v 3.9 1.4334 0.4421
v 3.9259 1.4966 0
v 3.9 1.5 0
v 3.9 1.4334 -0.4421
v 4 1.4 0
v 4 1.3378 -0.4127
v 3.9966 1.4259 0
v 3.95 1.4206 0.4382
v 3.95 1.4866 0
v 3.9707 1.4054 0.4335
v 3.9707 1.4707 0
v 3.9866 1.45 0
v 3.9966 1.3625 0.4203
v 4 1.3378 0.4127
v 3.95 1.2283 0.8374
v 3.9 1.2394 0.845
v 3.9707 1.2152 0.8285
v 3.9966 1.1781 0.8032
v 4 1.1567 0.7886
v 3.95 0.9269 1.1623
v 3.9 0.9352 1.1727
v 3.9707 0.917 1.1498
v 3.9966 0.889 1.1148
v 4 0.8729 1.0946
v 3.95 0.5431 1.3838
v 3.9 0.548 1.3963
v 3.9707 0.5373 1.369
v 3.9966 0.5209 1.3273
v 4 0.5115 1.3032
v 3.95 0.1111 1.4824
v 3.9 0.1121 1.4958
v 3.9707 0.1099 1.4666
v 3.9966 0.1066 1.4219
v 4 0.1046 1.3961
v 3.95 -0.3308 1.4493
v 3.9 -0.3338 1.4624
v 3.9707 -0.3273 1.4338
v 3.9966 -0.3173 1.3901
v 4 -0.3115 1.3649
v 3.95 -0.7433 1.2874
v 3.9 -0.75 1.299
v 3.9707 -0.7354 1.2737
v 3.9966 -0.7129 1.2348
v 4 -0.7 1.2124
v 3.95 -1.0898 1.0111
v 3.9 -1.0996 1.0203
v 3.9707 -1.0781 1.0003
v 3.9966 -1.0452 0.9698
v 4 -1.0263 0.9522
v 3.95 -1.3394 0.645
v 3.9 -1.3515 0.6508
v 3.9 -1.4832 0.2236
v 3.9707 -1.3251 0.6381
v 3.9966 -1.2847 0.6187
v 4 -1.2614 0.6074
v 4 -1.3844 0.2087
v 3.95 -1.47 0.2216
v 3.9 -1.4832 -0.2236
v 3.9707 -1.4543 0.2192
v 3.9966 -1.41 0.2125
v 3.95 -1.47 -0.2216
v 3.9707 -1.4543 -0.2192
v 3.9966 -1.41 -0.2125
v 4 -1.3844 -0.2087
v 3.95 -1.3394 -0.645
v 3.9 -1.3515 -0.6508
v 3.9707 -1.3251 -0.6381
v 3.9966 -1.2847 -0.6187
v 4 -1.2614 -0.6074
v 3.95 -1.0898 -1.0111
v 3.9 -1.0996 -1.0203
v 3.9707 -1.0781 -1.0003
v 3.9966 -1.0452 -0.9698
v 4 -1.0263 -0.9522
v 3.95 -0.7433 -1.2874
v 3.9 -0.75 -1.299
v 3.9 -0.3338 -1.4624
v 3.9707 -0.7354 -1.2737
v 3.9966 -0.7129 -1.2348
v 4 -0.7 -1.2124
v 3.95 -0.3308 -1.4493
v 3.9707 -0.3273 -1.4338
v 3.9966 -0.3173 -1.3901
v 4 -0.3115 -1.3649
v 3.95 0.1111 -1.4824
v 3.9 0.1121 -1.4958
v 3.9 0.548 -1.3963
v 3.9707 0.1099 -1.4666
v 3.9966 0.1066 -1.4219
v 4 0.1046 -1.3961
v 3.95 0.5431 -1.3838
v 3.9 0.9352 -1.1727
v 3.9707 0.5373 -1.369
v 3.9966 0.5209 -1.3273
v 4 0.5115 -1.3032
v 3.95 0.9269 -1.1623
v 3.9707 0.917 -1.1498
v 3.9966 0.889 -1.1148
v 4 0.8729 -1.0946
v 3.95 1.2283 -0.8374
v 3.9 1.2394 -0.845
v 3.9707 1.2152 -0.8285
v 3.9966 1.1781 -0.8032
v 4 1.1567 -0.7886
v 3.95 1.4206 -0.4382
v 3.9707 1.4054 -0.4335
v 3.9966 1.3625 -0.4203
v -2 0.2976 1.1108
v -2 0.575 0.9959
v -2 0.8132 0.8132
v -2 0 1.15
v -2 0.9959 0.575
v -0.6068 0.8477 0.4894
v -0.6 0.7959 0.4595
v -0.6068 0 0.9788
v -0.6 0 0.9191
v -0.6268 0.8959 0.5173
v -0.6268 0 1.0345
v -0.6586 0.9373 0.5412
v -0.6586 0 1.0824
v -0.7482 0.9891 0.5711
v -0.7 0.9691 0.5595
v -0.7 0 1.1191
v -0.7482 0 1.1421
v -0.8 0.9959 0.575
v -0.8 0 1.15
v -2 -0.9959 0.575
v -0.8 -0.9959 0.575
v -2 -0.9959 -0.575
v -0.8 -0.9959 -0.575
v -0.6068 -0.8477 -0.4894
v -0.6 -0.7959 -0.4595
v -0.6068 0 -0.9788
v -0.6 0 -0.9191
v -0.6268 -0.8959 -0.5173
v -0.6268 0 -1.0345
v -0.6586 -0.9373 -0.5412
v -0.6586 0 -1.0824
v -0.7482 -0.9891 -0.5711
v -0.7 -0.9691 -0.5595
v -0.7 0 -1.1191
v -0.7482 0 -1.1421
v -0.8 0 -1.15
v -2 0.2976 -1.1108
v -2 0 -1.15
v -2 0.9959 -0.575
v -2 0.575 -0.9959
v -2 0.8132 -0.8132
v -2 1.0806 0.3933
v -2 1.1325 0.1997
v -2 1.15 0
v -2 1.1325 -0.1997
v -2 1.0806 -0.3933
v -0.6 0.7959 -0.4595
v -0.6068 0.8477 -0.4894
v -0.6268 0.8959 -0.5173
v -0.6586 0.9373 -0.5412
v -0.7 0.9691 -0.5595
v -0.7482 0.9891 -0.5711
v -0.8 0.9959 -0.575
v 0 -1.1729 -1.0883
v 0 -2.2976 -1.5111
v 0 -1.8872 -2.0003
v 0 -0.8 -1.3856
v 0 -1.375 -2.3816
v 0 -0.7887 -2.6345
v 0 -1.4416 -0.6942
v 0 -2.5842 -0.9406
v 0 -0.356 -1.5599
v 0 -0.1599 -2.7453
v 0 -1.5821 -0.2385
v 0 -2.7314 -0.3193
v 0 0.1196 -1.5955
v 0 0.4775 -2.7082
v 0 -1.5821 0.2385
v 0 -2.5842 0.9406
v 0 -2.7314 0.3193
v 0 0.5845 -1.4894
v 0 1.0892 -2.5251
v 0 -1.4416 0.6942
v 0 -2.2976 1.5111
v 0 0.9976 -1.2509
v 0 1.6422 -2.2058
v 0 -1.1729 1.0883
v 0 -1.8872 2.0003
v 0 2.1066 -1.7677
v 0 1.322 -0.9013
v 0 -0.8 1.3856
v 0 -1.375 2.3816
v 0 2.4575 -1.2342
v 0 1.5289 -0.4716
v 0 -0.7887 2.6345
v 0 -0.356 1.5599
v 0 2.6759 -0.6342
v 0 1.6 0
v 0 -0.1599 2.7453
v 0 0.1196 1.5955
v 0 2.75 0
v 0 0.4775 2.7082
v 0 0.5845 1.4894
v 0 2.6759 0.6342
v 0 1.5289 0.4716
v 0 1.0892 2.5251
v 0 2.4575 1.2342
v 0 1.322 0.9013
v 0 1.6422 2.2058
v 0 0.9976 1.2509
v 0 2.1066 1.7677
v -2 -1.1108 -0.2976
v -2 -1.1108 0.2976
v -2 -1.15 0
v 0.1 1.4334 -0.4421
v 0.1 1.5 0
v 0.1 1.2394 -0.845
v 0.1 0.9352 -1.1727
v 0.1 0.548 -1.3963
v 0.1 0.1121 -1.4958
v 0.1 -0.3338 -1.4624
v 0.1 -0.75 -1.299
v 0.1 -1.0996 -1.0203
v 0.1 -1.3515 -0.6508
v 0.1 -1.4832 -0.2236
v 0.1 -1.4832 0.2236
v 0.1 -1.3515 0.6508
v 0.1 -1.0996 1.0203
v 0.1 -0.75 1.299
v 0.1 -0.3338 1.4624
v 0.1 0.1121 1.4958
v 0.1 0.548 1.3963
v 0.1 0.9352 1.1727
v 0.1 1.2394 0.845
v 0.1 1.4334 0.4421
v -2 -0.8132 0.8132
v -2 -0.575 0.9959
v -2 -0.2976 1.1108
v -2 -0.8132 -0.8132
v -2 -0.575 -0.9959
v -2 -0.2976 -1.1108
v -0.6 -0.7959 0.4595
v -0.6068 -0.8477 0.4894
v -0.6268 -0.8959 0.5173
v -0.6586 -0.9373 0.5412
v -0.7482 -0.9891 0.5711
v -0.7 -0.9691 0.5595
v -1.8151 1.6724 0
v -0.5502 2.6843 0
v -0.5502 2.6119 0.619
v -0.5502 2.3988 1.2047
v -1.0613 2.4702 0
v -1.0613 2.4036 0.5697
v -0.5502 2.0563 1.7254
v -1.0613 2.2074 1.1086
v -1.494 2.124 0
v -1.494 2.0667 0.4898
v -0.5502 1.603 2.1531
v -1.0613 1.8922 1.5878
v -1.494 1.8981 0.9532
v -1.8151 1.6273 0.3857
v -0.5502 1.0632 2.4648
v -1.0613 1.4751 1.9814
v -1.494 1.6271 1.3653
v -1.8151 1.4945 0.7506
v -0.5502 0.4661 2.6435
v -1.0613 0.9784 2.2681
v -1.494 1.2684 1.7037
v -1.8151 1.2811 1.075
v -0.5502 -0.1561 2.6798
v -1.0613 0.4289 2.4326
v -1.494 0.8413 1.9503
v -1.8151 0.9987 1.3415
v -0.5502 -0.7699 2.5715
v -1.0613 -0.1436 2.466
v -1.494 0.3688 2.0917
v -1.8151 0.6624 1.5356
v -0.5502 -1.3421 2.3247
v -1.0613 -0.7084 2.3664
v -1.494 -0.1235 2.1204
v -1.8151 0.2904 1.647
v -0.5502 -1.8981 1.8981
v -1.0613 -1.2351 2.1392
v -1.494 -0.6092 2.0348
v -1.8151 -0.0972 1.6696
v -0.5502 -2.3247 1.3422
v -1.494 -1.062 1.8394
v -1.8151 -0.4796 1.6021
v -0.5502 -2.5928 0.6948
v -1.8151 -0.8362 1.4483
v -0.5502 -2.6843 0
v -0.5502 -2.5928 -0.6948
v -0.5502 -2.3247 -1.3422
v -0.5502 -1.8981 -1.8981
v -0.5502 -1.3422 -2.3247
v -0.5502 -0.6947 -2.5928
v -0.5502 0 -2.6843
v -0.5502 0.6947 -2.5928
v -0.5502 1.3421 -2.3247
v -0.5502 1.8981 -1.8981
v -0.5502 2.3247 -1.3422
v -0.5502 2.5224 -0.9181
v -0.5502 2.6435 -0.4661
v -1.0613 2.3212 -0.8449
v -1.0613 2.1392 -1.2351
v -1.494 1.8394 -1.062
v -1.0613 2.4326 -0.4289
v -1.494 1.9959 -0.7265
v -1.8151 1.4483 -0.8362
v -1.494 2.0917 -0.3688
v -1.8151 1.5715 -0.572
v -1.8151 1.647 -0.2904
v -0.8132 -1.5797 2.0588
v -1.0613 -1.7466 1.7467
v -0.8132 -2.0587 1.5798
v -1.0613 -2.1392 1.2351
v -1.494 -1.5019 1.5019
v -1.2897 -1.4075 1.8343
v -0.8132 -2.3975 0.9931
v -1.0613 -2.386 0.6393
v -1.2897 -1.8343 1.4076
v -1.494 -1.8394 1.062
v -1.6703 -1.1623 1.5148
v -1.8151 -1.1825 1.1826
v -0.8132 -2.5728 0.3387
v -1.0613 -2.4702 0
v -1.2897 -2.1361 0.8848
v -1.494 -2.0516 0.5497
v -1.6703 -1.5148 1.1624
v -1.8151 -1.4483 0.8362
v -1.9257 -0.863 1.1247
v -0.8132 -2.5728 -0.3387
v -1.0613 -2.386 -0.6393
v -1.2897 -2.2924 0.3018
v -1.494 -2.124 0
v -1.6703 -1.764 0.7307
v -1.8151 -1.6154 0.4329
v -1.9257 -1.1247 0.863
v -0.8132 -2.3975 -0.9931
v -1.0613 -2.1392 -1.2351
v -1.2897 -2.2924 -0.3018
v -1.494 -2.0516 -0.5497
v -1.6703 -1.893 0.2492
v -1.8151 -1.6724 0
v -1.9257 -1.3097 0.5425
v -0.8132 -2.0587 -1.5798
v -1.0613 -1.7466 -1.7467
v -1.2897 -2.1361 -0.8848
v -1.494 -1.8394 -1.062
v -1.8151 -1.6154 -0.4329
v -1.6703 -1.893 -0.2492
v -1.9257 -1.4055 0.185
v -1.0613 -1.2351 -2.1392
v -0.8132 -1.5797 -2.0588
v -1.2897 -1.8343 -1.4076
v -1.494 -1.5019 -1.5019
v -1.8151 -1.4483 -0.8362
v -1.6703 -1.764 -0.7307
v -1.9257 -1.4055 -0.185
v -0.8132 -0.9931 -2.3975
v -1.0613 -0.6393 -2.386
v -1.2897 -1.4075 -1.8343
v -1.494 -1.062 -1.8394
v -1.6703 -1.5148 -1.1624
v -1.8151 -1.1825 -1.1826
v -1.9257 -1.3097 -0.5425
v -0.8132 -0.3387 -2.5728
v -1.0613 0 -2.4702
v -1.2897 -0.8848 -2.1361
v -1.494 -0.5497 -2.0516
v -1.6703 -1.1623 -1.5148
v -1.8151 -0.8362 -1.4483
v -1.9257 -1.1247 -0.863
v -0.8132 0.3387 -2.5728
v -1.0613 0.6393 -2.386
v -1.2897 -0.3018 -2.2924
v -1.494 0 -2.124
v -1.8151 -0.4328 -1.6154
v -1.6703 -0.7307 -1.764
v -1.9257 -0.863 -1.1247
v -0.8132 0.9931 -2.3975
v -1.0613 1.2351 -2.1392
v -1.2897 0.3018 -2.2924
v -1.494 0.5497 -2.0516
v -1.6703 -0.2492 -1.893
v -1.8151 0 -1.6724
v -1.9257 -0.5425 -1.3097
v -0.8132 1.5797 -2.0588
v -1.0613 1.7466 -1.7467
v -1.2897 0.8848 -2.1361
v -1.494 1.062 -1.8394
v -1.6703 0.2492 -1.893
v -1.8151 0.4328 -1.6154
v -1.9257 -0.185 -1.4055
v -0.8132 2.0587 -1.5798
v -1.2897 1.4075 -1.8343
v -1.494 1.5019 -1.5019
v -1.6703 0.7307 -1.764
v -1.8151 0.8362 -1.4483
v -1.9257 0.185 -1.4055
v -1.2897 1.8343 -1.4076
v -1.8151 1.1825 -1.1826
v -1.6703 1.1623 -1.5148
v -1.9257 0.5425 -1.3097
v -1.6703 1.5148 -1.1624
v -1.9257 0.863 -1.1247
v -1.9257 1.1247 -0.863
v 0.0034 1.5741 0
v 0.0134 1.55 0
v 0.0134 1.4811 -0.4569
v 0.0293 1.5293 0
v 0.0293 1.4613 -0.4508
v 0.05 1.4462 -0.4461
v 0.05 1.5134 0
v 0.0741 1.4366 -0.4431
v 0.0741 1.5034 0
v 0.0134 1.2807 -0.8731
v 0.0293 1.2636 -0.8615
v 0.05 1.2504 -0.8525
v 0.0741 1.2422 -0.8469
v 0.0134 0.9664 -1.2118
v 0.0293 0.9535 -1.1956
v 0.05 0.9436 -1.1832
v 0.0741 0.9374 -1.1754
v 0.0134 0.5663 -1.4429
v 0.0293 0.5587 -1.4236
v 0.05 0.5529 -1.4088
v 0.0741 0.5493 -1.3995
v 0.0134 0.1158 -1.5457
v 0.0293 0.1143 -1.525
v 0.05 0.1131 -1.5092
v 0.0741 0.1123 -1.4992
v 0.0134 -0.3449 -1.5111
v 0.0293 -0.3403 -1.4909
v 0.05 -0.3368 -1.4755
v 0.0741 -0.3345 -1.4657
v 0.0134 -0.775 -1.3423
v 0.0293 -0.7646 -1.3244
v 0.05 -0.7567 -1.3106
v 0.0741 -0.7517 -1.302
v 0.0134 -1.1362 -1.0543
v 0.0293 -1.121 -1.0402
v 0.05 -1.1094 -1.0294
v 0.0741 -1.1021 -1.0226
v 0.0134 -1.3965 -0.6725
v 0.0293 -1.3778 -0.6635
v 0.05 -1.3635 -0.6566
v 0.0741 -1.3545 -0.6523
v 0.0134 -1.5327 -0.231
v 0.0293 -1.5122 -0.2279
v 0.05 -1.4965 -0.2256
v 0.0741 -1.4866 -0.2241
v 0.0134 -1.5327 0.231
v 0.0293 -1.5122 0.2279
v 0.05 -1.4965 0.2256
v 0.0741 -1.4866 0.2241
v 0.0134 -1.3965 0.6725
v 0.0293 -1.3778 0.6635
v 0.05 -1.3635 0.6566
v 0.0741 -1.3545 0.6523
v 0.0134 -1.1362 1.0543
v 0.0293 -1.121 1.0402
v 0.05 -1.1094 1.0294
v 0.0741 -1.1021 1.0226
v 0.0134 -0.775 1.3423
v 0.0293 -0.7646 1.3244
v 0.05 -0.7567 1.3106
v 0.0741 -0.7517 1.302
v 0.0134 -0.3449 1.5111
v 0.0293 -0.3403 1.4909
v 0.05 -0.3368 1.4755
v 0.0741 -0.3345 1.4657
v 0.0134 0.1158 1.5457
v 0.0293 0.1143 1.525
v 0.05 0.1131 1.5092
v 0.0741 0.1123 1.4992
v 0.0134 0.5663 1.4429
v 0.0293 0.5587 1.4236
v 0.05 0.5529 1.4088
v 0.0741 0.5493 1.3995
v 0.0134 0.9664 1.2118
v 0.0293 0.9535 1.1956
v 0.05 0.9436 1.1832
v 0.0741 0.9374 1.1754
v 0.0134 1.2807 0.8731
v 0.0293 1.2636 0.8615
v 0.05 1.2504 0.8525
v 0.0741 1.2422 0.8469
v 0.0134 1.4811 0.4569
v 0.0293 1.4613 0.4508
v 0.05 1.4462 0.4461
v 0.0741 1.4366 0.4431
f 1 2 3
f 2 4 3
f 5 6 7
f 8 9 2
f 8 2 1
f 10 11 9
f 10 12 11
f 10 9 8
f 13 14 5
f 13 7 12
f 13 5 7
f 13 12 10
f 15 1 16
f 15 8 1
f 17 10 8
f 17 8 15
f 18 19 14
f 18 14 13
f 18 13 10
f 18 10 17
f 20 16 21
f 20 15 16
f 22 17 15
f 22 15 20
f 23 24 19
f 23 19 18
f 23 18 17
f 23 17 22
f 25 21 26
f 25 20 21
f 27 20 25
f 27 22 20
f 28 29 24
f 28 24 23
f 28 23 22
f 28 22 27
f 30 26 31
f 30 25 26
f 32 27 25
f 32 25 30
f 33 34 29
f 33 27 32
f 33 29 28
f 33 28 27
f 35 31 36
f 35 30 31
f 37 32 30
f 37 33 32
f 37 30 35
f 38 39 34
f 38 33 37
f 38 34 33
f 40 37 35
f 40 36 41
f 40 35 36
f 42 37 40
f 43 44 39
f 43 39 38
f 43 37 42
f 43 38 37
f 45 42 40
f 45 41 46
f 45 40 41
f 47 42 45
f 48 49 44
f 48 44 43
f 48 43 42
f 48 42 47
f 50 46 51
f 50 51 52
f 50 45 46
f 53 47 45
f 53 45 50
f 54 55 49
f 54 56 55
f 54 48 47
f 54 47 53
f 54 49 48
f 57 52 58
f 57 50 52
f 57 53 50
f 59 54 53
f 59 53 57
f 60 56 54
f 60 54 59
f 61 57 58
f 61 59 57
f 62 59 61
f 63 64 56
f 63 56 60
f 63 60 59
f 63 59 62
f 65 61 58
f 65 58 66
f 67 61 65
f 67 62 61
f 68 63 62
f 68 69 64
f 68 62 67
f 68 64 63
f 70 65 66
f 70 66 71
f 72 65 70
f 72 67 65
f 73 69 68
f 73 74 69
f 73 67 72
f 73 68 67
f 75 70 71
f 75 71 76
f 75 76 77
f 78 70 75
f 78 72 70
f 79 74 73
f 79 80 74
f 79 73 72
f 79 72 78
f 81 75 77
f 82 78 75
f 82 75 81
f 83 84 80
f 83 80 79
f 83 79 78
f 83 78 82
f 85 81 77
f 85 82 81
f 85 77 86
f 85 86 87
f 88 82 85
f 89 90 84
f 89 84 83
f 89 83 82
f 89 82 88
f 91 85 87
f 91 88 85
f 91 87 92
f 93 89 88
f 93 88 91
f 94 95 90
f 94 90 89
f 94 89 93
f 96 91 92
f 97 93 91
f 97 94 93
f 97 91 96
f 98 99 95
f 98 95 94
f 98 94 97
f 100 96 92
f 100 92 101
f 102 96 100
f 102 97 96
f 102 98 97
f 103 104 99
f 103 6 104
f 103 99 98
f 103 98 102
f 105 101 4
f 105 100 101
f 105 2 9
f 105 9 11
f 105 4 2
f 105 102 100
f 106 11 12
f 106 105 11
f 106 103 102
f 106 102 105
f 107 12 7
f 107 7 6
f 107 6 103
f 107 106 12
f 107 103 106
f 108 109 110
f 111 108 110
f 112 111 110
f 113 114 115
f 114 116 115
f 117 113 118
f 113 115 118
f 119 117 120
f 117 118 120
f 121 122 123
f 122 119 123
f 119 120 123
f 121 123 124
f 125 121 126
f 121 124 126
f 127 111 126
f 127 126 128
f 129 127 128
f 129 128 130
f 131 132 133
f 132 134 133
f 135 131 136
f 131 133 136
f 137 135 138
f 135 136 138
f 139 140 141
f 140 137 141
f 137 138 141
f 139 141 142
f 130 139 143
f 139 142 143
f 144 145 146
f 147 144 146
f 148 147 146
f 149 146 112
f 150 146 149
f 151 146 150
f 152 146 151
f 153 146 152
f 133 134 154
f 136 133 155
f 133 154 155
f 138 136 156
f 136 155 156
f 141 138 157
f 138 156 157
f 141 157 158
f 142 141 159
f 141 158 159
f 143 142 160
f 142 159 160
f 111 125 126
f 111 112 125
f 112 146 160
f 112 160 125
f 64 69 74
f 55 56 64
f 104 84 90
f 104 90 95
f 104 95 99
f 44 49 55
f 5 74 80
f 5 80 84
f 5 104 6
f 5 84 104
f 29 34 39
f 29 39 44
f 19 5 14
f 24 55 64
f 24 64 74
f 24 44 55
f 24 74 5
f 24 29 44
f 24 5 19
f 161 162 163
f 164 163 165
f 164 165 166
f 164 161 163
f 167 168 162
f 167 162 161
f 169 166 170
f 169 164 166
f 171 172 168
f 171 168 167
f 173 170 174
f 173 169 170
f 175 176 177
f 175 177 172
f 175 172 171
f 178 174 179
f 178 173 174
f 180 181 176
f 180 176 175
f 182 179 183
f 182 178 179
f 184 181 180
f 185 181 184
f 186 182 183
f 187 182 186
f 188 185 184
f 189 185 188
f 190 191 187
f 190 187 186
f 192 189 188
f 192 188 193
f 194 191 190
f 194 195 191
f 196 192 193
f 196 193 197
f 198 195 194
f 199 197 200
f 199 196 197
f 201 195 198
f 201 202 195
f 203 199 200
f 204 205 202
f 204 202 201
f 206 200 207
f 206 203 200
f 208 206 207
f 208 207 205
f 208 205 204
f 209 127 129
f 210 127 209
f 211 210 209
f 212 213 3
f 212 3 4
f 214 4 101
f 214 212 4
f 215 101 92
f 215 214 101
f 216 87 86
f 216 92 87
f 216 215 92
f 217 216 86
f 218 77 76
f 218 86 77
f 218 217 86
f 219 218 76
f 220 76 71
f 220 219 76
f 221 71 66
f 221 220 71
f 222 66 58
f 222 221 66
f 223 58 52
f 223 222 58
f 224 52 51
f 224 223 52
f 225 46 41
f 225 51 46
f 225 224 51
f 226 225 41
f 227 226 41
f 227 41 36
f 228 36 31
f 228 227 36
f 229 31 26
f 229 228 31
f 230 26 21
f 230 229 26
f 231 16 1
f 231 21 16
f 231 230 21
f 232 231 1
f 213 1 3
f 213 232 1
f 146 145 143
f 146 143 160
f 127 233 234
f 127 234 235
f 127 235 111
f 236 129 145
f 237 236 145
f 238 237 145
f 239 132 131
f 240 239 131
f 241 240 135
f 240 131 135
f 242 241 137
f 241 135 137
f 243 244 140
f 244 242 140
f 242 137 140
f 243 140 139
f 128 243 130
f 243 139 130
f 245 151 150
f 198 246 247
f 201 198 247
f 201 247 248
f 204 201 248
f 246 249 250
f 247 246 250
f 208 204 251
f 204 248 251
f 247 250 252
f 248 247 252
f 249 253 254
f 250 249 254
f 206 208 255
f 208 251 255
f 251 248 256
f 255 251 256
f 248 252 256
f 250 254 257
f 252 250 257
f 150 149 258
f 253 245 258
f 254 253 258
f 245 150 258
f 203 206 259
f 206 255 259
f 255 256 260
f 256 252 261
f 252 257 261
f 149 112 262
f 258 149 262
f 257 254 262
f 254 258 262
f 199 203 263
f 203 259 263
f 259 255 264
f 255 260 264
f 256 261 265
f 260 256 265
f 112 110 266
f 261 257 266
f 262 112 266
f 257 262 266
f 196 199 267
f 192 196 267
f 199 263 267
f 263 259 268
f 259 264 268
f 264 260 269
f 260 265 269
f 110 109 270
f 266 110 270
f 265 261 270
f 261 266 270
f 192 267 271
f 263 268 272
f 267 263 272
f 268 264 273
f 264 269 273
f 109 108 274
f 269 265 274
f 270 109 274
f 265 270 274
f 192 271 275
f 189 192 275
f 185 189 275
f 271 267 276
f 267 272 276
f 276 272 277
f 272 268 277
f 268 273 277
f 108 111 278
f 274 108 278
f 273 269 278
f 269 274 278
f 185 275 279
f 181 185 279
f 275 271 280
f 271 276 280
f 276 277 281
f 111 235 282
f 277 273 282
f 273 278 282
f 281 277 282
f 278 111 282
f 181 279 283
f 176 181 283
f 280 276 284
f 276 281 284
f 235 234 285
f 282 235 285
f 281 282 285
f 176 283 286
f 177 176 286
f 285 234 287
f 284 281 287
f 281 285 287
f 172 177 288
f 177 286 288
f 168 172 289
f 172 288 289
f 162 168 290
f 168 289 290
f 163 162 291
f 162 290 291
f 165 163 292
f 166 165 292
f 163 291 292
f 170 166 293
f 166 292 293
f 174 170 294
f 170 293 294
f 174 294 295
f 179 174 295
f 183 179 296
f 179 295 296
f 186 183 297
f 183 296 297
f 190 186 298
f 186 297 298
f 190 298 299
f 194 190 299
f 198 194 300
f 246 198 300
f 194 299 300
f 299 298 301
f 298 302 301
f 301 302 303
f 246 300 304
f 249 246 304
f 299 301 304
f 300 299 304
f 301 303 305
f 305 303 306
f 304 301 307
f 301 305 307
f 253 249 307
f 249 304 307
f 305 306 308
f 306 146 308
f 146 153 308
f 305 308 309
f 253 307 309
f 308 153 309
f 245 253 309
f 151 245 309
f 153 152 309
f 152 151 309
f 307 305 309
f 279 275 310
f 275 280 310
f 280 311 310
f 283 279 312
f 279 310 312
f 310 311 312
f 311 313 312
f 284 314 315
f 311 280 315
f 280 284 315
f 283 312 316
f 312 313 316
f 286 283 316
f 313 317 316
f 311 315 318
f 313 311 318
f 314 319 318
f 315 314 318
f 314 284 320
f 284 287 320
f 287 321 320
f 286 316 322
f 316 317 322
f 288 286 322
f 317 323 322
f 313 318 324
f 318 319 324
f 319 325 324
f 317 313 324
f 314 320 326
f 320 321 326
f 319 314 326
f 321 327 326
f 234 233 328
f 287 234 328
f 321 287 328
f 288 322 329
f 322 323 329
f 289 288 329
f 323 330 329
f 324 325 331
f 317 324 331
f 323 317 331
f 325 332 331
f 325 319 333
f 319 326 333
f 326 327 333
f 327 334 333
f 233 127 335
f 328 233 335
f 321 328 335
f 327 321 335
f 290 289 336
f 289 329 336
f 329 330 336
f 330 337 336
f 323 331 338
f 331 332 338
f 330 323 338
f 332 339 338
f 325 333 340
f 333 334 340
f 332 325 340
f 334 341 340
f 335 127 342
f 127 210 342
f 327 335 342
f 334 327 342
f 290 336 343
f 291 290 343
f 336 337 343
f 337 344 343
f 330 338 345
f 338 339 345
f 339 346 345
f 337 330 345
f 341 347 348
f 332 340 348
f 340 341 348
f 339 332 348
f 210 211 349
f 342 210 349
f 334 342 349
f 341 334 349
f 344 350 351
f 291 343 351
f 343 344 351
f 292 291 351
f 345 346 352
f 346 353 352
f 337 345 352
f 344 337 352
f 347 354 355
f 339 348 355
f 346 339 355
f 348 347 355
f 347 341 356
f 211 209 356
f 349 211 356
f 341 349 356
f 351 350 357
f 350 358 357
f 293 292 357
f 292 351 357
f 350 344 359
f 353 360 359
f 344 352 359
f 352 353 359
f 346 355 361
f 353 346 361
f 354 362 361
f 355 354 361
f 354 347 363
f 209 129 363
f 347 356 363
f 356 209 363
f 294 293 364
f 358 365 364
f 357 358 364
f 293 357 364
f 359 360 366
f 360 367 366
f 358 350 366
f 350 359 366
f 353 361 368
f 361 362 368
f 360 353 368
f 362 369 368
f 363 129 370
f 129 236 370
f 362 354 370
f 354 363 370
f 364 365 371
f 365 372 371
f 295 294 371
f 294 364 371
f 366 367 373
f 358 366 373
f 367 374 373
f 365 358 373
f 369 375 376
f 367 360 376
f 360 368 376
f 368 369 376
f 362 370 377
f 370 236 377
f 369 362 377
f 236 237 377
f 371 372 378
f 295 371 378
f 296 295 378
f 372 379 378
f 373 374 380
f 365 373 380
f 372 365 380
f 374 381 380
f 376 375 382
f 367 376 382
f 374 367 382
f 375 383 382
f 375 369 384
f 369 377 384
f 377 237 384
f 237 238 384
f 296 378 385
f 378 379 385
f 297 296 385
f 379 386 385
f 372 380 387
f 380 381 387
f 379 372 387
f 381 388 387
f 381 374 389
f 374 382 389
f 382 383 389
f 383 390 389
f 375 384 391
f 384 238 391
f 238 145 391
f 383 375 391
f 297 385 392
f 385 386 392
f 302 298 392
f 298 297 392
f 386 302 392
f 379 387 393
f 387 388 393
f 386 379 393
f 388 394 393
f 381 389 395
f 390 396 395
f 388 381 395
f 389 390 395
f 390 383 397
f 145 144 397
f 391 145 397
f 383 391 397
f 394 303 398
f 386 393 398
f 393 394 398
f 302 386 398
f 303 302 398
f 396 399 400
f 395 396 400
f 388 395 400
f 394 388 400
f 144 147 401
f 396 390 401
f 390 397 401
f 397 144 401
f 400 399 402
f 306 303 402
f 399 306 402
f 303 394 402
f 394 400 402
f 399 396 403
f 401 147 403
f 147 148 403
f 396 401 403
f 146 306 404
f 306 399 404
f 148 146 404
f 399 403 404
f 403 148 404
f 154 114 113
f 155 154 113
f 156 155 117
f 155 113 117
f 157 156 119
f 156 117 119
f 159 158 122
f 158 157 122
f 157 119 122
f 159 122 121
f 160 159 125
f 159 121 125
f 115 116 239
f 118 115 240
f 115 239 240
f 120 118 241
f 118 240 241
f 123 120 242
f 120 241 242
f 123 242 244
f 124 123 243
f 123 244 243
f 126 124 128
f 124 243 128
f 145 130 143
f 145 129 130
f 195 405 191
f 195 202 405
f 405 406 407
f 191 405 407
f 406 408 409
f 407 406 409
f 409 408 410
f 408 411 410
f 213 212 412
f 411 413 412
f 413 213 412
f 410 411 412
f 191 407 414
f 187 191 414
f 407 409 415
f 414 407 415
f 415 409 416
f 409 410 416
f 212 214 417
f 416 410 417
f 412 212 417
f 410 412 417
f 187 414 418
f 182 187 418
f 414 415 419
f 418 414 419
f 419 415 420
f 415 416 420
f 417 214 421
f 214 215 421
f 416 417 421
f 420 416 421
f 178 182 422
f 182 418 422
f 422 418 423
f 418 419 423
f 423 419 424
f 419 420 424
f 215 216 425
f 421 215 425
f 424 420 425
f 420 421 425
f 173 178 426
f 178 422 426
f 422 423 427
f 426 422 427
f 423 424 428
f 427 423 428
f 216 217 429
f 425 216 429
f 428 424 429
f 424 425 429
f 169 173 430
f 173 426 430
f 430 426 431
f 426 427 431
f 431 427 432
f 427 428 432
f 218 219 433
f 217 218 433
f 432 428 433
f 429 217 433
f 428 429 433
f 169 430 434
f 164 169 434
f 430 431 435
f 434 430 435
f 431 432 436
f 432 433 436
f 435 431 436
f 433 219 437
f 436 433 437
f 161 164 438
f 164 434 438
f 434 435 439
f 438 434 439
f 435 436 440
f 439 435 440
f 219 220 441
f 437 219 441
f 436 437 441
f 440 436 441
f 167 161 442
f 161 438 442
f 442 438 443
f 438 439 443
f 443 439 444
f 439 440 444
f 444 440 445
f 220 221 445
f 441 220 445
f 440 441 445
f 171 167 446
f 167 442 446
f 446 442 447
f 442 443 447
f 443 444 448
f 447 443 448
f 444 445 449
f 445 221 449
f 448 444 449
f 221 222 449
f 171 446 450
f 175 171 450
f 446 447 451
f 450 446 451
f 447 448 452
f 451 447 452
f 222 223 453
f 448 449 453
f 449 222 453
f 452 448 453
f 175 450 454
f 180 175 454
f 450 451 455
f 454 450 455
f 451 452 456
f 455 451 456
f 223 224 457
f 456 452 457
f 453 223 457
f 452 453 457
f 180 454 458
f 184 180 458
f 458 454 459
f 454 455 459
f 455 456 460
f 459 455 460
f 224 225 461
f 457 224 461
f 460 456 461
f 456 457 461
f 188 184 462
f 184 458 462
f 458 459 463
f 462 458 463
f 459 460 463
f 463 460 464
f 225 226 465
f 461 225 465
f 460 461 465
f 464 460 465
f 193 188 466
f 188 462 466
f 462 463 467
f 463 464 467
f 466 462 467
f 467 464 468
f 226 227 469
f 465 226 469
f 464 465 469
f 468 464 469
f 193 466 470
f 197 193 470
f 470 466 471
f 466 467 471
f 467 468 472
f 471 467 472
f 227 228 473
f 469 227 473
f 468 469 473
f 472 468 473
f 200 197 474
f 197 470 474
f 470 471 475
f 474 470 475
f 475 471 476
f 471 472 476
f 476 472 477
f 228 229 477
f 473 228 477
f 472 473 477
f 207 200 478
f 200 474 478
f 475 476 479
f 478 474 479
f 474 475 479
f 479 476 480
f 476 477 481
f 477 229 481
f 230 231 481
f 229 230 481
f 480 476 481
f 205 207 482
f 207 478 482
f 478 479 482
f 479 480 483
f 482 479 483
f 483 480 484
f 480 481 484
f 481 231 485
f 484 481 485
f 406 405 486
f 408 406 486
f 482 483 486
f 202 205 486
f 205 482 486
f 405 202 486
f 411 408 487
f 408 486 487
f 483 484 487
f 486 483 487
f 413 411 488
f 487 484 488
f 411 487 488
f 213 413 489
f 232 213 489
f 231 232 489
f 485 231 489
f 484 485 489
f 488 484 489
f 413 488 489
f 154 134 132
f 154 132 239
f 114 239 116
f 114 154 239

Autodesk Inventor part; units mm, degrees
ref_plane "YZ Plane" through (0, 0, 0) normal (1, 0, 0) x (0, 1, 0)
ref_plane "XZ Plane" through (0, 0, 0) normal (0, 1, 0) x (-1, 0, 0)
ref_plane "XY Plane" through (0, 0, 0) normal (0, 0, 1) x (1, 0, 0)
sketch "スケッチ1" plane through (0, 0, 0) normal (0, 0, 1) x (1, 0, 0)
  line L0 (0, 0) -> (4, 0)
  line L1 (4, 0) -> (4, 1.5)
  line L2 (4, 1.5) -> (0, 1.5)
  line L3 (0, 1.5) -> (0, 0)
  line L4 (0, 0) -> (0, 2.75)
  line L5 (0, 0) -> (-2, 0)
  line L6 (-2, 0) -> (0, 0)
  line L7 (-2, 0) -> (-2, 1.15)
  arc A0 (0, 2.75) -> (-2, 1.15) centre (-0.0403, 0.7504) ccw
  dimension "d0" = 1.5
  dimension "d1" = 4
  dimension "d3" = 2
  dimension "d4" = 2.75
  dimension "d5" = 1.15
  dimension "d6" = 2
revolve "回転1" add sketch "スケッチ1" angle 360 about axis through (-2, 0, 0) along (1, 0, 0)
thread "ねじ1" size "M3x0.5" class "6g" standard "ANSI Metric M Profile" length 100
sketch "スケッチ2" plane through (-2, 0, 0) normal (-1, 0, 0) x (0, 0, 1)
  circle A0 centre (0, 0) radius 1.15 projected
  line L0 (-0.575, 0.9959) -> (0.575, 0.9959)
  line L1 (0.575, 0.9959) -> (1.15, 0)
  line L2 (1.15, 0) -> (0.575, -0.9959)
  line L3 (0.575, -0.9959) -> (-0.575, -0.9959)
  line L4 (-0.575, -0.9959) -> (-1.15, 0)
  line L5 (-1.15, 0) -> (-0.575, 0.9959)
  dimension "d10" = 1.15
  dimension "d11" = 1.9919
extrude "押し出し1" cut sketch "スケッチ2" against normal blind 1.4 contours L2 L3 L4 L5 L0 L1
fillet "フィレット1" radius 0.2 6 edges at (-0.6, 0.9959, 0) (-0.6, 0.498, 0.8625) (-0.6, 0.498, -0.8625) (-0.6, -0.498, -0.8625) (-0.6, -0.9959, 0) (-0.6, -0.498, 0.8625)
fillet "フィレット2" radius 0.1 1 edges at (0, -1.5, 0)
fillet "フィレット3" radius 0.1 1 edges at (4, -1.5, 0)
properties part number "ボタンネジM3L4" material "鋼"
